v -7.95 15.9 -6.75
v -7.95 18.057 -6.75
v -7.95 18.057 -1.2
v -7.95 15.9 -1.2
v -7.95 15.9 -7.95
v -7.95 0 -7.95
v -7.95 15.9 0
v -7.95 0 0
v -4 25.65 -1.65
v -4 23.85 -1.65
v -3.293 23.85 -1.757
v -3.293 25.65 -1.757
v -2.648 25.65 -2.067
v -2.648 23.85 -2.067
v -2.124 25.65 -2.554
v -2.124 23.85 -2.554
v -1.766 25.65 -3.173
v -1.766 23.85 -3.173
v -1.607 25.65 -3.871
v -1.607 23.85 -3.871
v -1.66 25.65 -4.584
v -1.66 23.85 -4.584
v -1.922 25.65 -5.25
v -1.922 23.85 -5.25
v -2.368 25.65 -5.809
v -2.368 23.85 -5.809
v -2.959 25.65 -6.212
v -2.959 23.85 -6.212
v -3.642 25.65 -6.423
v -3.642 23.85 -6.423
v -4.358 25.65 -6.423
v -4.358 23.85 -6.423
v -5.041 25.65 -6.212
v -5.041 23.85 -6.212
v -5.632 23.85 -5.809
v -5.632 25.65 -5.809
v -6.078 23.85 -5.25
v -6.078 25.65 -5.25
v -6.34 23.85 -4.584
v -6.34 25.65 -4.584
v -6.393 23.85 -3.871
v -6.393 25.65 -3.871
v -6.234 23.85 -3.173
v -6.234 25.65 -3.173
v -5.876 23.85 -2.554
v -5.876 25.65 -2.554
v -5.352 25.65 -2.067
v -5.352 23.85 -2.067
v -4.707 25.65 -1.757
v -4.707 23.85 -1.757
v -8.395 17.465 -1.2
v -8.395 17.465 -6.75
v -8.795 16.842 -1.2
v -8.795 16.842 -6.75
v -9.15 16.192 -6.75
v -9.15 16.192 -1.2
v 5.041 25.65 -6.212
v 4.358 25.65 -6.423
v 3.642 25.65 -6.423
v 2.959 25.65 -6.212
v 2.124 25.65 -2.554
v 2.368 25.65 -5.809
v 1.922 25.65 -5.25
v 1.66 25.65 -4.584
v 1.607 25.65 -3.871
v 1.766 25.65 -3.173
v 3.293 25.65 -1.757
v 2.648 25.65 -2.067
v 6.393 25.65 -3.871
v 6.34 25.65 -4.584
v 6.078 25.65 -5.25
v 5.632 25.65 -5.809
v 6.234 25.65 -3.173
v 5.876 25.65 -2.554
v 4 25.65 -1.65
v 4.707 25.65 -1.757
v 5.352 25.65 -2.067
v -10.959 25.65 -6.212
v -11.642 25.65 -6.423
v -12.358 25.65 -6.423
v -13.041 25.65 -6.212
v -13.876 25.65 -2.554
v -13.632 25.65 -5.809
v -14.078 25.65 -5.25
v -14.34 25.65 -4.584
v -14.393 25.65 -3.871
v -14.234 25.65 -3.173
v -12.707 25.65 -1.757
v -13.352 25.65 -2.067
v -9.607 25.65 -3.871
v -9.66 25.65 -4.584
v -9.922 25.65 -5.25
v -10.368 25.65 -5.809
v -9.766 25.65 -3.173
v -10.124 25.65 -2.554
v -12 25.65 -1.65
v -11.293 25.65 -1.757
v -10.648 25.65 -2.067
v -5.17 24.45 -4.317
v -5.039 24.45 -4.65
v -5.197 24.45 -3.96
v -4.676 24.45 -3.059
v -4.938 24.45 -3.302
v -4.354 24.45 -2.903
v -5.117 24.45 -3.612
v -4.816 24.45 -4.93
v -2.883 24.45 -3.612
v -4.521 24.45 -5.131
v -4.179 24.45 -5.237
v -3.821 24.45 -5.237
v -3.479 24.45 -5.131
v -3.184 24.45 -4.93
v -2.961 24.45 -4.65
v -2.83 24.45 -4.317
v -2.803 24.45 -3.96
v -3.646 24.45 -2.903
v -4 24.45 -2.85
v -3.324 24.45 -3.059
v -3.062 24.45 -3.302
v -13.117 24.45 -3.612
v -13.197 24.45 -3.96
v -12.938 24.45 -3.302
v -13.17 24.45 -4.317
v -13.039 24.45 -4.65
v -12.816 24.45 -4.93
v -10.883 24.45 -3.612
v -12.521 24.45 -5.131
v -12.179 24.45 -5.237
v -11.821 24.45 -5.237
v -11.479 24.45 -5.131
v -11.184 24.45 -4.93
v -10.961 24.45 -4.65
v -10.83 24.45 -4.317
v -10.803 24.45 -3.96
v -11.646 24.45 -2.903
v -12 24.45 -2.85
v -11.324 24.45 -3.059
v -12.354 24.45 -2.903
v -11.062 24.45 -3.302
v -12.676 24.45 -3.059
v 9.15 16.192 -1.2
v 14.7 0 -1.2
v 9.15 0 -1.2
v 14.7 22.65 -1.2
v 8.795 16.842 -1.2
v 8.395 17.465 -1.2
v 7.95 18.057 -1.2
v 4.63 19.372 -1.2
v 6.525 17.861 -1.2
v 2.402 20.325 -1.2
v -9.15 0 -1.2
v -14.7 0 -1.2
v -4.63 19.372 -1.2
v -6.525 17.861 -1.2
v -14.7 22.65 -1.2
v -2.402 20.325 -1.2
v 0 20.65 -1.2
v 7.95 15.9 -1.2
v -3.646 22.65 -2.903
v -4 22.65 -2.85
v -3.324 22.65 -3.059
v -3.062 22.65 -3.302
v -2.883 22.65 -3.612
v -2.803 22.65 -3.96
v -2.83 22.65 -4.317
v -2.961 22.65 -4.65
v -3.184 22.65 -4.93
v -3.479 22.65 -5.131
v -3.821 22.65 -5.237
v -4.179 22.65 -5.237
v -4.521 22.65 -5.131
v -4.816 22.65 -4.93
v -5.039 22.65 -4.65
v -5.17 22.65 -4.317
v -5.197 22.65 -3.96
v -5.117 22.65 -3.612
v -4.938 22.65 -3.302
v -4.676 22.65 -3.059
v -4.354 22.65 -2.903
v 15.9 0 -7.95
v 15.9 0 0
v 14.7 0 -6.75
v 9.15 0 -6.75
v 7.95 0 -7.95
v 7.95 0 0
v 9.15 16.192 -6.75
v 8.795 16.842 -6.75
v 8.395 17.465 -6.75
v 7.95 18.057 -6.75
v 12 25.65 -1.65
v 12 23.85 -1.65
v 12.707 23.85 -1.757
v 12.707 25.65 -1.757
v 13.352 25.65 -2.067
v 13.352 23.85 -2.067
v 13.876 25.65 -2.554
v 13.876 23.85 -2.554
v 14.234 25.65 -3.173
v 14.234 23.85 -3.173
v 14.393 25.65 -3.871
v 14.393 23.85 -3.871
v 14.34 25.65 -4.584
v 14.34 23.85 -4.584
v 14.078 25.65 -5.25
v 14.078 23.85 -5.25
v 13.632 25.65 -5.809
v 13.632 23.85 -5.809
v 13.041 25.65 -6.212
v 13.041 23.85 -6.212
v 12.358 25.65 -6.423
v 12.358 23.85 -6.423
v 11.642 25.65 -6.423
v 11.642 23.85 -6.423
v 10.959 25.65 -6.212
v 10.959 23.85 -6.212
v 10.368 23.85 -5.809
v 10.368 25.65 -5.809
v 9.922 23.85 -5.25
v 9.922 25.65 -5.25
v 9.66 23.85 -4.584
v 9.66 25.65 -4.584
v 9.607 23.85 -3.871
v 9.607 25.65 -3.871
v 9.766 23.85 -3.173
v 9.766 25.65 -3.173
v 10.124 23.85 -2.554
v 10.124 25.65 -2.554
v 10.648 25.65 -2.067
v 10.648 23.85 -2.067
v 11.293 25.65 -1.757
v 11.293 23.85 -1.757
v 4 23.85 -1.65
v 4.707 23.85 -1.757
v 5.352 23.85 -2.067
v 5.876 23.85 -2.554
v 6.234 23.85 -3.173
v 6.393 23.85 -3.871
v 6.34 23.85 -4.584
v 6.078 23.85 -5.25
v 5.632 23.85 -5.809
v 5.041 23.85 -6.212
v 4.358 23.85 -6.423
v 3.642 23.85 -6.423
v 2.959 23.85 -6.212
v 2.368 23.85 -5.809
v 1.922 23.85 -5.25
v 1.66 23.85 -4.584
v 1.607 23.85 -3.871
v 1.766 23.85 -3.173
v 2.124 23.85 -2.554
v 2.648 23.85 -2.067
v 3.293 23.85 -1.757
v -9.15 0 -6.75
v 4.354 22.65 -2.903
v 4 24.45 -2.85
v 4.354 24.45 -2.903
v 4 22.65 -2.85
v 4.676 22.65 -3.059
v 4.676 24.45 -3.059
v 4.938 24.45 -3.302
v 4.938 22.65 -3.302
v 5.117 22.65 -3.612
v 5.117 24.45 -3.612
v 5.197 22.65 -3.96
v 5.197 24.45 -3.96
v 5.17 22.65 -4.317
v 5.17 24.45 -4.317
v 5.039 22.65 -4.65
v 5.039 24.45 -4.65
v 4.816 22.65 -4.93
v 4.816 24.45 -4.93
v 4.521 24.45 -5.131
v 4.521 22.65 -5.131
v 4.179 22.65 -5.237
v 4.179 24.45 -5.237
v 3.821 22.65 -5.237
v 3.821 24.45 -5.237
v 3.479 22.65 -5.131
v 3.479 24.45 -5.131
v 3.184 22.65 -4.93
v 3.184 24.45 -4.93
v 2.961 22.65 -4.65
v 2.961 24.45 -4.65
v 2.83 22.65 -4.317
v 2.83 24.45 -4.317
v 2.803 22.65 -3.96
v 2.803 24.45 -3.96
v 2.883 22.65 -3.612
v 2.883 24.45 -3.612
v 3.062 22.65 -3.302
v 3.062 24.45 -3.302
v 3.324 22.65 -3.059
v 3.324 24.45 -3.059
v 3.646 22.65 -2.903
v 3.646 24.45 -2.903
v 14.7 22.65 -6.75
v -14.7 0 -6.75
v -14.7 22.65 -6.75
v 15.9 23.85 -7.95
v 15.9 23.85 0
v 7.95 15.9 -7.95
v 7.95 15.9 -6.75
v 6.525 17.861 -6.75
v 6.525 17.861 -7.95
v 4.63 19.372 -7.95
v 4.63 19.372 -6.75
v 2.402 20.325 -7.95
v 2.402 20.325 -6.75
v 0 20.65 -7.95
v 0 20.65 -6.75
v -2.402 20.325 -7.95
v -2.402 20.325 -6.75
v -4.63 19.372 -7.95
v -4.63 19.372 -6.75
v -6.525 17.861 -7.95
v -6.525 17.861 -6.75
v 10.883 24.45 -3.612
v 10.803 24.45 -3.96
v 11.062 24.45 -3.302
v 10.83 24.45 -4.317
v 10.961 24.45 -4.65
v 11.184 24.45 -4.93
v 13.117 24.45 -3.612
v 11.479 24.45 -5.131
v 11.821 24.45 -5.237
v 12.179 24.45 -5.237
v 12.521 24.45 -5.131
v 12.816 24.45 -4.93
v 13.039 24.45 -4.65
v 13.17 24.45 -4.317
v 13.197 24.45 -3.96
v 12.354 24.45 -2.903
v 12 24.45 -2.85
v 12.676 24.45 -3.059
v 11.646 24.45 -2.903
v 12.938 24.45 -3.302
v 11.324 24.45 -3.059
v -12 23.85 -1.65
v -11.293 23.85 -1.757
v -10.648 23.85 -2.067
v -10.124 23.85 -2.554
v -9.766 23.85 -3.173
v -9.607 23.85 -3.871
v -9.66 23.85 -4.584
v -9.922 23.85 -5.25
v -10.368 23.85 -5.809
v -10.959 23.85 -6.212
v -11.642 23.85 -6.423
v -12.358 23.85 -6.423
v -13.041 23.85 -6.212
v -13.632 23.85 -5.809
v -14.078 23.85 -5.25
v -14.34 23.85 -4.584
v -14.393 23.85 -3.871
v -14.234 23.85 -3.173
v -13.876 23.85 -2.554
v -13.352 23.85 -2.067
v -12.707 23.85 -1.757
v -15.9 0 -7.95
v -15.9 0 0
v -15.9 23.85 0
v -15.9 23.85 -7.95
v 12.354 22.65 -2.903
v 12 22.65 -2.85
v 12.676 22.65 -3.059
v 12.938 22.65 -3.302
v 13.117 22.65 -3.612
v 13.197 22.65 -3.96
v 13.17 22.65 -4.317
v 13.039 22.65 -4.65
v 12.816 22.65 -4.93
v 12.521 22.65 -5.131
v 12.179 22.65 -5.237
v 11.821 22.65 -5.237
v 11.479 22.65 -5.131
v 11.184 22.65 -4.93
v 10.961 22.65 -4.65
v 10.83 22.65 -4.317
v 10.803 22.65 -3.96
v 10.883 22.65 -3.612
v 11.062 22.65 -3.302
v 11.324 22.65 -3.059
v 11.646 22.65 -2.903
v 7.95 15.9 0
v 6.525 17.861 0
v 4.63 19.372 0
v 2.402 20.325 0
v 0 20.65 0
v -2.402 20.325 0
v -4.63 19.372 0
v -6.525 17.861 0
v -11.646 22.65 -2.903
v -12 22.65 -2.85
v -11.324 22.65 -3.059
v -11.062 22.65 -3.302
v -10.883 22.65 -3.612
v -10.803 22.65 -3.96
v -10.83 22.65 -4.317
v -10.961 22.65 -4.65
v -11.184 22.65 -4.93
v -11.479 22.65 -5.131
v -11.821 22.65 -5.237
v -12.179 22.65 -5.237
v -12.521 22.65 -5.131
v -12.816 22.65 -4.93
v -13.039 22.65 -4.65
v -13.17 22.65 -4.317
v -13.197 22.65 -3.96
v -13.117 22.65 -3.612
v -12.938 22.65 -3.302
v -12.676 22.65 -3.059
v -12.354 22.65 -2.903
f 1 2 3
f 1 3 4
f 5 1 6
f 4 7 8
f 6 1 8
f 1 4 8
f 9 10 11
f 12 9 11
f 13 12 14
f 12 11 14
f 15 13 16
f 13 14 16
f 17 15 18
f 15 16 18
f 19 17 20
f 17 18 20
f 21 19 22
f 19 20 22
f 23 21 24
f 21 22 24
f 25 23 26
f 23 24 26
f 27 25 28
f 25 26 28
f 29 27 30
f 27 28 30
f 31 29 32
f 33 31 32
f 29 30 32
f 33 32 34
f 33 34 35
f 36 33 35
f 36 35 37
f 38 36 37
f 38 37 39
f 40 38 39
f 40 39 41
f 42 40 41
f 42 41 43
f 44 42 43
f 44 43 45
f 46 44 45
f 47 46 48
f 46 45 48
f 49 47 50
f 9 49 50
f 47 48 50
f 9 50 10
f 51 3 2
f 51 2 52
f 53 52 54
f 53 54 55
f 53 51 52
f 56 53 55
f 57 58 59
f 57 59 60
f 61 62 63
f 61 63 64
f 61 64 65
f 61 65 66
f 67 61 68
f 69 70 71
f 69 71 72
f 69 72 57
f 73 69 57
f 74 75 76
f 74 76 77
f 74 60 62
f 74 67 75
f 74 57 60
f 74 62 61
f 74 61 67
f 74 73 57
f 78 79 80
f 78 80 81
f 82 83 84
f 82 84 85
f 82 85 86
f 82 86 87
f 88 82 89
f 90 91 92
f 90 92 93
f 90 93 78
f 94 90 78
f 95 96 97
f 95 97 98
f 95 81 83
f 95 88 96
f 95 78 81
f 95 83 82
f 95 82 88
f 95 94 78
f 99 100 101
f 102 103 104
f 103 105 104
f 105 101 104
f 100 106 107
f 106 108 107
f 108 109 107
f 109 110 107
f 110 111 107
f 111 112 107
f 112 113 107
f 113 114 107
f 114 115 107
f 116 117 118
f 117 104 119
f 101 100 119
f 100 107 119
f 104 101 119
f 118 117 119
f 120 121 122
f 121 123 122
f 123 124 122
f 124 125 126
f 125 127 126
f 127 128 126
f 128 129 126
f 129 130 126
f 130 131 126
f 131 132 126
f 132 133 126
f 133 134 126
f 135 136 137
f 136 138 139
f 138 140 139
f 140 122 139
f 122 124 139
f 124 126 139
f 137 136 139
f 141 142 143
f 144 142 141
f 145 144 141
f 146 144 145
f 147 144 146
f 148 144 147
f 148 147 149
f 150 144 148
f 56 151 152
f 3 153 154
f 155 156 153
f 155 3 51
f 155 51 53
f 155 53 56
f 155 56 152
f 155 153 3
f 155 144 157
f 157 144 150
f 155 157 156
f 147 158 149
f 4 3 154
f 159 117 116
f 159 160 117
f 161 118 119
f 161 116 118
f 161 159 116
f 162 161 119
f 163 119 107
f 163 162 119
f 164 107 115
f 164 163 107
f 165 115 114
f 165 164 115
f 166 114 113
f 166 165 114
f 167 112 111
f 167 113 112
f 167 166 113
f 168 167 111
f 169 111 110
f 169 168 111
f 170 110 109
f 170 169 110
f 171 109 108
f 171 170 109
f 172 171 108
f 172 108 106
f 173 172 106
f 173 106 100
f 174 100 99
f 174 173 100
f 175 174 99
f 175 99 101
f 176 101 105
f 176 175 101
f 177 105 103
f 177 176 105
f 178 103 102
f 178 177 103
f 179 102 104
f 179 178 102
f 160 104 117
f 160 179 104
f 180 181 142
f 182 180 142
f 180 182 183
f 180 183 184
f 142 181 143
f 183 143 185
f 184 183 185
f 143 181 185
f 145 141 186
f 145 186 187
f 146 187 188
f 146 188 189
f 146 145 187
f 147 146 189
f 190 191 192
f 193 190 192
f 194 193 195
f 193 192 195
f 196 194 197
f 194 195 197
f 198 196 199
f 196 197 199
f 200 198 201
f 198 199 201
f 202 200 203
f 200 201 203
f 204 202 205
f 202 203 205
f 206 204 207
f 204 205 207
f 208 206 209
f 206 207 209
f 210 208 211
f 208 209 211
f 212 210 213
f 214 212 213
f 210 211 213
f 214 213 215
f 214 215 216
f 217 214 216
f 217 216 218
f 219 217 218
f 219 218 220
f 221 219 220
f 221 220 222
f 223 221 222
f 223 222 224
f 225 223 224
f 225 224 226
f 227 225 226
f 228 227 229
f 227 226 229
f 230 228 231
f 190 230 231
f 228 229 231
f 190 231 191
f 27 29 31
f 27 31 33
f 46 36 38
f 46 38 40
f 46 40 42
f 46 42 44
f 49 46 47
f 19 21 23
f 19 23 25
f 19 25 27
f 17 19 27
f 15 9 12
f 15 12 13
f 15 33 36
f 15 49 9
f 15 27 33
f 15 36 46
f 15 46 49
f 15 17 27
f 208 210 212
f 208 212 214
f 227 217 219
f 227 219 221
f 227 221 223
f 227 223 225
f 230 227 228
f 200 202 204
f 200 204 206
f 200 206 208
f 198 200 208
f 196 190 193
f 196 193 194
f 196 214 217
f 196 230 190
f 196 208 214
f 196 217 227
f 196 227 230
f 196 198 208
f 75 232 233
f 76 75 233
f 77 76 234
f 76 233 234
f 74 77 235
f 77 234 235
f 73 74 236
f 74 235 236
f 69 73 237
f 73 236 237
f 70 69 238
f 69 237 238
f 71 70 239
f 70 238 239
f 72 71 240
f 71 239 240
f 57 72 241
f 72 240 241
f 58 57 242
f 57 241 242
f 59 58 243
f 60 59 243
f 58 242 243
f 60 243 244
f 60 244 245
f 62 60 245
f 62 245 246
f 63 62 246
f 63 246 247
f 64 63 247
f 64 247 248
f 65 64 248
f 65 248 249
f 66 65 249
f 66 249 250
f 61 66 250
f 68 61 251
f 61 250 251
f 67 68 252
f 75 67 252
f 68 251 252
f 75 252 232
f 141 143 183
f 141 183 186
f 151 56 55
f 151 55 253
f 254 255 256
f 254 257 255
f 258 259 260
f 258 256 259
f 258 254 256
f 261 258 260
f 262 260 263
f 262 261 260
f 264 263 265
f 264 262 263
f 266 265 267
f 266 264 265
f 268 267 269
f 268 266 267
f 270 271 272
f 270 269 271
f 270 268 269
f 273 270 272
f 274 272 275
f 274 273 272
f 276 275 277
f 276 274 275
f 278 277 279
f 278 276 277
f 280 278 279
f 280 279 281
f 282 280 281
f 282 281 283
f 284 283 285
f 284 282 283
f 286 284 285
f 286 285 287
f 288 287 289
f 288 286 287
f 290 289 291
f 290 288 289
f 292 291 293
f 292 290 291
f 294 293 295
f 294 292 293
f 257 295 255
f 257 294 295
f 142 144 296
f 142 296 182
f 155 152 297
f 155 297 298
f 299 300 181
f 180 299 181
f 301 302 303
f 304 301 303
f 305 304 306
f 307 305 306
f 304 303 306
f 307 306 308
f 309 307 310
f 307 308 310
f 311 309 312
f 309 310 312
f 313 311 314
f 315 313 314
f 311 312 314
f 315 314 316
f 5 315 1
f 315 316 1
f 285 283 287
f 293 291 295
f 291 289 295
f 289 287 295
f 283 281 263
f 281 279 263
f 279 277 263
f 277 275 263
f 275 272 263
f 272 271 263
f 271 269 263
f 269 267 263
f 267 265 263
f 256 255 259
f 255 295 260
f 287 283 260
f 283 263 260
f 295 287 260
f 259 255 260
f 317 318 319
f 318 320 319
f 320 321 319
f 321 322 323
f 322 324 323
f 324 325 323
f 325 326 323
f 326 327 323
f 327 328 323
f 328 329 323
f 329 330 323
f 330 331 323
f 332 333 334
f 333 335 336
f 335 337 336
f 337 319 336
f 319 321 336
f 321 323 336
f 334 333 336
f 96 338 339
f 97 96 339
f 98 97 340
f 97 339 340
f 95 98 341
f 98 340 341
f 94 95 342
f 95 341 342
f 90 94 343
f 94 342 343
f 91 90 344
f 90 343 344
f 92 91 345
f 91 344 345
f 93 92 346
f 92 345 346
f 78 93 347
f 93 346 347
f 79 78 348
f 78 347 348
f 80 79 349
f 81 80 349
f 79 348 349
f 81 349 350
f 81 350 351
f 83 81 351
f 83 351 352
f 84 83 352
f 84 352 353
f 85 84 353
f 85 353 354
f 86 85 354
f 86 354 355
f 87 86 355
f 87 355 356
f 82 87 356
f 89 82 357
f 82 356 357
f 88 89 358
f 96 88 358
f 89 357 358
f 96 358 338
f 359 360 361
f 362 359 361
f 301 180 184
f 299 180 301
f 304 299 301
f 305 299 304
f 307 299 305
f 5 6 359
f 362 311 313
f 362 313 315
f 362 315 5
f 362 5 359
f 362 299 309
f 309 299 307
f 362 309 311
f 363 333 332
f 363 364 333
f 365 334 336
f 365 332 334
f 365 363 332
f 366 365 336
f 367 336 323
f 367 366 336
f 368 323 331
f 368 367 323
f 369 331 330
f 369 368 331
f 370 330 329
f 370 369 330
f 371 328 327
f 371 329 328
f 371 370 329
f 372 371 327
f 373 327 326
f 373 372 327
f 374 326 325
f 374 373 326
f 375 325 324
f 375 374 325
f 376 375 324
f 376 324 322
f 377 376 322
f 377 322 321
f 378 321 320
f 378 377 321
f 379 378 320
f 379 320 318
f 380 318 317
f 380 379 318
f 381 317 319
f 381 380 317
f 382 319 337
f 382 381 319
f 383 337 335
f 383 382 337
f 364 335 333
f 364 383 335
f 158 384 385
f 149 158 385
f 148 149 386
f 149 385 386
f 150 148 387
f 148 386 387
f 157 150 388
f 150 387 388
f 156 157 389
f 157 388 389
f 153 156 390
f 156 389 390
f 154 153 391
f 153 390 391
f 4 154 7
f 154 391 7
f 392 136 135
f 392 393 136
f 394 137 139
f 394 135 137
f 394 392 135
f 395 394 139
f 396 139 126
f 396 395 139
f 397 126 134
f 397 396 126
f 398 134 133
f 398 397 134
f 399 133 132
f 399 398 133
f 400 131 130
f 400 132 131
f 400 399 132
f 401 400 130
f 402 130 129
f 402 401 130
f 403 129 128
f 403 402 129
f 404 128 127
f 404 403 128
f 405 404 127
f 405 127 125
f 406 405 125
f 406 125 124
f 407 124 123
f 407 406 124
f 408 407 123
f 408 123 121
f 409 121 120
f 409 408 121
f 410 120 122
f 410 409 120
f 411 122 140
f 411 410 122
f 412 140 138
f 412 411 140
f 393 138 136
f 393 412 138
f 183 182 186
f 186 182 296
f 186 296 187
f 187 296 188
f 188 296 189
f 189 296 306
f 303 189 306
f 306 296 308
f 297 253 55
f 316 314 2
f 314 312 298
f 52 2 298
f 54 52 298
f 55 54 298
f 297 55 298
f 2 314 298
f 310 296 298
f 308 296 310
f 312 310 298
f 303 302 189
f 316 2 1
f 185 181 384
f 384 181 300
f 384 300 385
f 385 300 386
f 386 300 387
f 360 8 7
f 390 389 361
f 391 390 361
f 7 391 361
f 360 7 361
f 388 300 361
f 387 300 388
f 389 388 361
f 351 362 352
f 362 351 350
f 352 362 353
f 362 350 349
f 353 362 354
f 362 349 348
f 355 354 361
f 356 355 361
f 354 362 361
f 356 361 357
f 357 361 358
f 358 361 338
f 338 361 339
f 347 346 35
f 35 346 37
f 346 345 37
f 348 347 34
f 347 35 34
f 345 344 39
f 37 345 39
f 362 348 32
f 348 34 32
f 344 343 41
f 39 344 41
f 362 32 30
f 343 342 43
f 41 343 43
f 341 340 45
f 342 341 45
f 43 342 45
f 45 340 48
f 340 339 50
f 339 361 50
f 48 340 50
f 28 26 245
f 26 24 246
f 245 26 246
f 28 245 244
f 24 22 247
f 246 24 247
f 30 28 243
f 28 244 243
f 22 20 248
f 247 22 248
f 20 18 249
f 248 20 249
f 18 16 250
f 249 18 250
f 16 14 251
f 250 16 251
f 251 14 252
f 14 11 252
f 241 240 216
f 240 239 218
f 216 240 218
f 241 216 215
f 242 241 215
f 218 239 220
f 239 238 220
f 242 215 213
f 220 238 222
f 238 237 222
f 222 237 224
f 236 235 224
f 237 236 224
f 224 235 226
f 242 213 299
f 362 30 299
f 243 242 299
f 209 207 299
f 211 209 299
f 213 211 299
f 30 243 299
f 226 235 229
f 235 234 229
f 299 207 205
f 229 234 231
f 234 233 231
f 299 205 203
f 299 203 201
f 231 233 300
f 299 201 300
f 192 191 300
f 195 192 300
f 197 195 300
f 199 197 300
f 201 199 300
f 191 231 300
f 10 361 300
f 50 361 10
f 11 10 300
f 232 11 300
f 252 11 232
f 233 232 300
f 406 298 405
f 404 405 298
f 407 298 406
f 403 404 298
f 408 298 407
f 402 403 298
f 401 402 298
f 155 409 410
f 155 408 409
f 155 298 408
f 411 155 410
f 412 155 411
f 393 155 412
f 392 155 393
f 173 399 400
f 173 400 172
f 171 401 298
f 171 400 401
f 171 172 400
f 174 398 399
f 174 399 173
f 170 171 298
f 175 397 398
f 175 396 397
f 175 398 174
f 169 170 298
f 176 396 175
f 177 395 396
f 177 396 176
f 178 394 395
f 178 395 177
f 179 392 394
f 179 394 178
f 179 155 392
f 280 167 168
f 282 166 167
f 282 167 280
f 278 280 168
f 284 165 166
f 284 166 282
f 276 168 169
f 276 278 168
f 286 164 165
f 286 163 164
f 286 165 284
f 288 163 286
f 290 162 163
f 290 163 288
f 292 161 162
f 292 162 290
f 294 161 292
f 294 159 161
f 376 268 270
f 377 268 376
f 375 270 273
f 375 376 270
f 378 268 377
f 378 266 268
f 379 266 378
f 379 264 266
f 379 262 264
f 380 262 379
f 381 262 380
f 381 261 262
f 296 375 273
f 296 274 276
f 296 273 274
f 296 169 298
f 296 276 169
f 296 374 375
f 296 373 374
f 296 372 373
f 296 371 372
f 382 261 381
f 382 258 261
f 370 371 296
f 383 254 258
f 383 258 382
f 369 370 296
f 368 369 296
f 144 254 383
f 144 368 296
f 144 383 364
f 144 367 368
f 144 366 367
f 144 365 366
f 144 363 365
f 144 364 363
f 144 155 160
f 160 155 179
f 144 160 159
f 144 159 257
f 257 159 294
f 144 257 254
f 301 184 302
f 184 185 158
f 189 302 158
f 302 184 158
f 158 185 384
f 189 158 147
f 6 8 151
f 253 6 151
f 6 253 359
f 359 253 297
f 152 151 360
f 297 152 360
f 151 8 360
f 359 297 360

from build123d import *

# Parameters (mm, degrees)
BOSS_EXTRUDE1_DEPTH = 7.95
SKETCH2_R           = 2.4
BOSS_EXTRUDE2_DEPTH = 1.8
LPATTERN1_COUNT     = 4
LPATTERN1_PITCH     = 8
SHELL3_T            = -1.2
CUT_EXTRUDE1_START  = -1.2
SKETCH3_W           = 15.9
SKETCH3_H           = 5.55
CUT_EXTRUDE1_DEPTH  = 29.546176225


with BuildPart() as part:
    # Sketch1 → Boss-Extrude1 (new body)
    with BuildSketch(Plane.XY):
        with BuildLine():
            Line((-7.95, 0), (-15.9, 0))
            Line((-15.9, 0), (-15.9, 23.85))
            Line((-15.9, 23.85), (15.9, 23.85))
            Line((15.9, 23.85), (15.9, 0))
            Line((15.9, 0), (7.95, 0))
            Line((7.95, 0), (7.95, 15.9))
            ThreePointArc((7.95, 15.9), (0, 20.65), (-7.95, 15.9))
            Line((-7.95, 15.9), (-7.95, 0))
        make_face()
    extrude(amount=-BOSS_EXTRUDE1_DEPTH)

    # Sketch2 → Boss-Extrude2 (add)
    with BuildSketch(Plane(origin=(0, 23.85, 0), x_dir=(1, 0, 0), z_dir=(0, 1, 0))):
        with Locations(Location((-12, 4.05, 0), (0, 0, 270))):
            Circle(SKETCH2_R)
    boss_extrude2 = extrude(amount=BOSS_EXTRUDE2_DEPTH)

    # LPattern1: Boss-Extrude2 ×4
    with Locations(*[(i * LPATTERN1_PITCH, 0, 0) for i in range(1, LPATTERN1_COUNT)]):
        add(boss_extrude2)

    # Shell3
    shell3_openings = [part.faces().sort_by_distance(p)[0] for p in [
        (-11.925, 0, -3.975),
        (11.925, 0, -3.975),
    ]]
    offset(amount=SHELL3_T, openings=shell3_openings, kind=Kind.INTERSECTION)

    # Sketch3 → Cut-Extrude1 (cut, through all)
    with BuildSketch(Plane(origin=(0, 23.85, 0), x_dir=(1, 0, 0), z_dir=(0, 1, 0)).offset(CUT_EXTRUDE1_START)):
        with Locations((0, 3.975)):
            Rectangle(SKETCH3_W, SKETCH3_H)
    extrude(amount=-CUT_EXTRUDE1_DEPTH, mode=Mode.SUBTRACT)


solid = part.part
